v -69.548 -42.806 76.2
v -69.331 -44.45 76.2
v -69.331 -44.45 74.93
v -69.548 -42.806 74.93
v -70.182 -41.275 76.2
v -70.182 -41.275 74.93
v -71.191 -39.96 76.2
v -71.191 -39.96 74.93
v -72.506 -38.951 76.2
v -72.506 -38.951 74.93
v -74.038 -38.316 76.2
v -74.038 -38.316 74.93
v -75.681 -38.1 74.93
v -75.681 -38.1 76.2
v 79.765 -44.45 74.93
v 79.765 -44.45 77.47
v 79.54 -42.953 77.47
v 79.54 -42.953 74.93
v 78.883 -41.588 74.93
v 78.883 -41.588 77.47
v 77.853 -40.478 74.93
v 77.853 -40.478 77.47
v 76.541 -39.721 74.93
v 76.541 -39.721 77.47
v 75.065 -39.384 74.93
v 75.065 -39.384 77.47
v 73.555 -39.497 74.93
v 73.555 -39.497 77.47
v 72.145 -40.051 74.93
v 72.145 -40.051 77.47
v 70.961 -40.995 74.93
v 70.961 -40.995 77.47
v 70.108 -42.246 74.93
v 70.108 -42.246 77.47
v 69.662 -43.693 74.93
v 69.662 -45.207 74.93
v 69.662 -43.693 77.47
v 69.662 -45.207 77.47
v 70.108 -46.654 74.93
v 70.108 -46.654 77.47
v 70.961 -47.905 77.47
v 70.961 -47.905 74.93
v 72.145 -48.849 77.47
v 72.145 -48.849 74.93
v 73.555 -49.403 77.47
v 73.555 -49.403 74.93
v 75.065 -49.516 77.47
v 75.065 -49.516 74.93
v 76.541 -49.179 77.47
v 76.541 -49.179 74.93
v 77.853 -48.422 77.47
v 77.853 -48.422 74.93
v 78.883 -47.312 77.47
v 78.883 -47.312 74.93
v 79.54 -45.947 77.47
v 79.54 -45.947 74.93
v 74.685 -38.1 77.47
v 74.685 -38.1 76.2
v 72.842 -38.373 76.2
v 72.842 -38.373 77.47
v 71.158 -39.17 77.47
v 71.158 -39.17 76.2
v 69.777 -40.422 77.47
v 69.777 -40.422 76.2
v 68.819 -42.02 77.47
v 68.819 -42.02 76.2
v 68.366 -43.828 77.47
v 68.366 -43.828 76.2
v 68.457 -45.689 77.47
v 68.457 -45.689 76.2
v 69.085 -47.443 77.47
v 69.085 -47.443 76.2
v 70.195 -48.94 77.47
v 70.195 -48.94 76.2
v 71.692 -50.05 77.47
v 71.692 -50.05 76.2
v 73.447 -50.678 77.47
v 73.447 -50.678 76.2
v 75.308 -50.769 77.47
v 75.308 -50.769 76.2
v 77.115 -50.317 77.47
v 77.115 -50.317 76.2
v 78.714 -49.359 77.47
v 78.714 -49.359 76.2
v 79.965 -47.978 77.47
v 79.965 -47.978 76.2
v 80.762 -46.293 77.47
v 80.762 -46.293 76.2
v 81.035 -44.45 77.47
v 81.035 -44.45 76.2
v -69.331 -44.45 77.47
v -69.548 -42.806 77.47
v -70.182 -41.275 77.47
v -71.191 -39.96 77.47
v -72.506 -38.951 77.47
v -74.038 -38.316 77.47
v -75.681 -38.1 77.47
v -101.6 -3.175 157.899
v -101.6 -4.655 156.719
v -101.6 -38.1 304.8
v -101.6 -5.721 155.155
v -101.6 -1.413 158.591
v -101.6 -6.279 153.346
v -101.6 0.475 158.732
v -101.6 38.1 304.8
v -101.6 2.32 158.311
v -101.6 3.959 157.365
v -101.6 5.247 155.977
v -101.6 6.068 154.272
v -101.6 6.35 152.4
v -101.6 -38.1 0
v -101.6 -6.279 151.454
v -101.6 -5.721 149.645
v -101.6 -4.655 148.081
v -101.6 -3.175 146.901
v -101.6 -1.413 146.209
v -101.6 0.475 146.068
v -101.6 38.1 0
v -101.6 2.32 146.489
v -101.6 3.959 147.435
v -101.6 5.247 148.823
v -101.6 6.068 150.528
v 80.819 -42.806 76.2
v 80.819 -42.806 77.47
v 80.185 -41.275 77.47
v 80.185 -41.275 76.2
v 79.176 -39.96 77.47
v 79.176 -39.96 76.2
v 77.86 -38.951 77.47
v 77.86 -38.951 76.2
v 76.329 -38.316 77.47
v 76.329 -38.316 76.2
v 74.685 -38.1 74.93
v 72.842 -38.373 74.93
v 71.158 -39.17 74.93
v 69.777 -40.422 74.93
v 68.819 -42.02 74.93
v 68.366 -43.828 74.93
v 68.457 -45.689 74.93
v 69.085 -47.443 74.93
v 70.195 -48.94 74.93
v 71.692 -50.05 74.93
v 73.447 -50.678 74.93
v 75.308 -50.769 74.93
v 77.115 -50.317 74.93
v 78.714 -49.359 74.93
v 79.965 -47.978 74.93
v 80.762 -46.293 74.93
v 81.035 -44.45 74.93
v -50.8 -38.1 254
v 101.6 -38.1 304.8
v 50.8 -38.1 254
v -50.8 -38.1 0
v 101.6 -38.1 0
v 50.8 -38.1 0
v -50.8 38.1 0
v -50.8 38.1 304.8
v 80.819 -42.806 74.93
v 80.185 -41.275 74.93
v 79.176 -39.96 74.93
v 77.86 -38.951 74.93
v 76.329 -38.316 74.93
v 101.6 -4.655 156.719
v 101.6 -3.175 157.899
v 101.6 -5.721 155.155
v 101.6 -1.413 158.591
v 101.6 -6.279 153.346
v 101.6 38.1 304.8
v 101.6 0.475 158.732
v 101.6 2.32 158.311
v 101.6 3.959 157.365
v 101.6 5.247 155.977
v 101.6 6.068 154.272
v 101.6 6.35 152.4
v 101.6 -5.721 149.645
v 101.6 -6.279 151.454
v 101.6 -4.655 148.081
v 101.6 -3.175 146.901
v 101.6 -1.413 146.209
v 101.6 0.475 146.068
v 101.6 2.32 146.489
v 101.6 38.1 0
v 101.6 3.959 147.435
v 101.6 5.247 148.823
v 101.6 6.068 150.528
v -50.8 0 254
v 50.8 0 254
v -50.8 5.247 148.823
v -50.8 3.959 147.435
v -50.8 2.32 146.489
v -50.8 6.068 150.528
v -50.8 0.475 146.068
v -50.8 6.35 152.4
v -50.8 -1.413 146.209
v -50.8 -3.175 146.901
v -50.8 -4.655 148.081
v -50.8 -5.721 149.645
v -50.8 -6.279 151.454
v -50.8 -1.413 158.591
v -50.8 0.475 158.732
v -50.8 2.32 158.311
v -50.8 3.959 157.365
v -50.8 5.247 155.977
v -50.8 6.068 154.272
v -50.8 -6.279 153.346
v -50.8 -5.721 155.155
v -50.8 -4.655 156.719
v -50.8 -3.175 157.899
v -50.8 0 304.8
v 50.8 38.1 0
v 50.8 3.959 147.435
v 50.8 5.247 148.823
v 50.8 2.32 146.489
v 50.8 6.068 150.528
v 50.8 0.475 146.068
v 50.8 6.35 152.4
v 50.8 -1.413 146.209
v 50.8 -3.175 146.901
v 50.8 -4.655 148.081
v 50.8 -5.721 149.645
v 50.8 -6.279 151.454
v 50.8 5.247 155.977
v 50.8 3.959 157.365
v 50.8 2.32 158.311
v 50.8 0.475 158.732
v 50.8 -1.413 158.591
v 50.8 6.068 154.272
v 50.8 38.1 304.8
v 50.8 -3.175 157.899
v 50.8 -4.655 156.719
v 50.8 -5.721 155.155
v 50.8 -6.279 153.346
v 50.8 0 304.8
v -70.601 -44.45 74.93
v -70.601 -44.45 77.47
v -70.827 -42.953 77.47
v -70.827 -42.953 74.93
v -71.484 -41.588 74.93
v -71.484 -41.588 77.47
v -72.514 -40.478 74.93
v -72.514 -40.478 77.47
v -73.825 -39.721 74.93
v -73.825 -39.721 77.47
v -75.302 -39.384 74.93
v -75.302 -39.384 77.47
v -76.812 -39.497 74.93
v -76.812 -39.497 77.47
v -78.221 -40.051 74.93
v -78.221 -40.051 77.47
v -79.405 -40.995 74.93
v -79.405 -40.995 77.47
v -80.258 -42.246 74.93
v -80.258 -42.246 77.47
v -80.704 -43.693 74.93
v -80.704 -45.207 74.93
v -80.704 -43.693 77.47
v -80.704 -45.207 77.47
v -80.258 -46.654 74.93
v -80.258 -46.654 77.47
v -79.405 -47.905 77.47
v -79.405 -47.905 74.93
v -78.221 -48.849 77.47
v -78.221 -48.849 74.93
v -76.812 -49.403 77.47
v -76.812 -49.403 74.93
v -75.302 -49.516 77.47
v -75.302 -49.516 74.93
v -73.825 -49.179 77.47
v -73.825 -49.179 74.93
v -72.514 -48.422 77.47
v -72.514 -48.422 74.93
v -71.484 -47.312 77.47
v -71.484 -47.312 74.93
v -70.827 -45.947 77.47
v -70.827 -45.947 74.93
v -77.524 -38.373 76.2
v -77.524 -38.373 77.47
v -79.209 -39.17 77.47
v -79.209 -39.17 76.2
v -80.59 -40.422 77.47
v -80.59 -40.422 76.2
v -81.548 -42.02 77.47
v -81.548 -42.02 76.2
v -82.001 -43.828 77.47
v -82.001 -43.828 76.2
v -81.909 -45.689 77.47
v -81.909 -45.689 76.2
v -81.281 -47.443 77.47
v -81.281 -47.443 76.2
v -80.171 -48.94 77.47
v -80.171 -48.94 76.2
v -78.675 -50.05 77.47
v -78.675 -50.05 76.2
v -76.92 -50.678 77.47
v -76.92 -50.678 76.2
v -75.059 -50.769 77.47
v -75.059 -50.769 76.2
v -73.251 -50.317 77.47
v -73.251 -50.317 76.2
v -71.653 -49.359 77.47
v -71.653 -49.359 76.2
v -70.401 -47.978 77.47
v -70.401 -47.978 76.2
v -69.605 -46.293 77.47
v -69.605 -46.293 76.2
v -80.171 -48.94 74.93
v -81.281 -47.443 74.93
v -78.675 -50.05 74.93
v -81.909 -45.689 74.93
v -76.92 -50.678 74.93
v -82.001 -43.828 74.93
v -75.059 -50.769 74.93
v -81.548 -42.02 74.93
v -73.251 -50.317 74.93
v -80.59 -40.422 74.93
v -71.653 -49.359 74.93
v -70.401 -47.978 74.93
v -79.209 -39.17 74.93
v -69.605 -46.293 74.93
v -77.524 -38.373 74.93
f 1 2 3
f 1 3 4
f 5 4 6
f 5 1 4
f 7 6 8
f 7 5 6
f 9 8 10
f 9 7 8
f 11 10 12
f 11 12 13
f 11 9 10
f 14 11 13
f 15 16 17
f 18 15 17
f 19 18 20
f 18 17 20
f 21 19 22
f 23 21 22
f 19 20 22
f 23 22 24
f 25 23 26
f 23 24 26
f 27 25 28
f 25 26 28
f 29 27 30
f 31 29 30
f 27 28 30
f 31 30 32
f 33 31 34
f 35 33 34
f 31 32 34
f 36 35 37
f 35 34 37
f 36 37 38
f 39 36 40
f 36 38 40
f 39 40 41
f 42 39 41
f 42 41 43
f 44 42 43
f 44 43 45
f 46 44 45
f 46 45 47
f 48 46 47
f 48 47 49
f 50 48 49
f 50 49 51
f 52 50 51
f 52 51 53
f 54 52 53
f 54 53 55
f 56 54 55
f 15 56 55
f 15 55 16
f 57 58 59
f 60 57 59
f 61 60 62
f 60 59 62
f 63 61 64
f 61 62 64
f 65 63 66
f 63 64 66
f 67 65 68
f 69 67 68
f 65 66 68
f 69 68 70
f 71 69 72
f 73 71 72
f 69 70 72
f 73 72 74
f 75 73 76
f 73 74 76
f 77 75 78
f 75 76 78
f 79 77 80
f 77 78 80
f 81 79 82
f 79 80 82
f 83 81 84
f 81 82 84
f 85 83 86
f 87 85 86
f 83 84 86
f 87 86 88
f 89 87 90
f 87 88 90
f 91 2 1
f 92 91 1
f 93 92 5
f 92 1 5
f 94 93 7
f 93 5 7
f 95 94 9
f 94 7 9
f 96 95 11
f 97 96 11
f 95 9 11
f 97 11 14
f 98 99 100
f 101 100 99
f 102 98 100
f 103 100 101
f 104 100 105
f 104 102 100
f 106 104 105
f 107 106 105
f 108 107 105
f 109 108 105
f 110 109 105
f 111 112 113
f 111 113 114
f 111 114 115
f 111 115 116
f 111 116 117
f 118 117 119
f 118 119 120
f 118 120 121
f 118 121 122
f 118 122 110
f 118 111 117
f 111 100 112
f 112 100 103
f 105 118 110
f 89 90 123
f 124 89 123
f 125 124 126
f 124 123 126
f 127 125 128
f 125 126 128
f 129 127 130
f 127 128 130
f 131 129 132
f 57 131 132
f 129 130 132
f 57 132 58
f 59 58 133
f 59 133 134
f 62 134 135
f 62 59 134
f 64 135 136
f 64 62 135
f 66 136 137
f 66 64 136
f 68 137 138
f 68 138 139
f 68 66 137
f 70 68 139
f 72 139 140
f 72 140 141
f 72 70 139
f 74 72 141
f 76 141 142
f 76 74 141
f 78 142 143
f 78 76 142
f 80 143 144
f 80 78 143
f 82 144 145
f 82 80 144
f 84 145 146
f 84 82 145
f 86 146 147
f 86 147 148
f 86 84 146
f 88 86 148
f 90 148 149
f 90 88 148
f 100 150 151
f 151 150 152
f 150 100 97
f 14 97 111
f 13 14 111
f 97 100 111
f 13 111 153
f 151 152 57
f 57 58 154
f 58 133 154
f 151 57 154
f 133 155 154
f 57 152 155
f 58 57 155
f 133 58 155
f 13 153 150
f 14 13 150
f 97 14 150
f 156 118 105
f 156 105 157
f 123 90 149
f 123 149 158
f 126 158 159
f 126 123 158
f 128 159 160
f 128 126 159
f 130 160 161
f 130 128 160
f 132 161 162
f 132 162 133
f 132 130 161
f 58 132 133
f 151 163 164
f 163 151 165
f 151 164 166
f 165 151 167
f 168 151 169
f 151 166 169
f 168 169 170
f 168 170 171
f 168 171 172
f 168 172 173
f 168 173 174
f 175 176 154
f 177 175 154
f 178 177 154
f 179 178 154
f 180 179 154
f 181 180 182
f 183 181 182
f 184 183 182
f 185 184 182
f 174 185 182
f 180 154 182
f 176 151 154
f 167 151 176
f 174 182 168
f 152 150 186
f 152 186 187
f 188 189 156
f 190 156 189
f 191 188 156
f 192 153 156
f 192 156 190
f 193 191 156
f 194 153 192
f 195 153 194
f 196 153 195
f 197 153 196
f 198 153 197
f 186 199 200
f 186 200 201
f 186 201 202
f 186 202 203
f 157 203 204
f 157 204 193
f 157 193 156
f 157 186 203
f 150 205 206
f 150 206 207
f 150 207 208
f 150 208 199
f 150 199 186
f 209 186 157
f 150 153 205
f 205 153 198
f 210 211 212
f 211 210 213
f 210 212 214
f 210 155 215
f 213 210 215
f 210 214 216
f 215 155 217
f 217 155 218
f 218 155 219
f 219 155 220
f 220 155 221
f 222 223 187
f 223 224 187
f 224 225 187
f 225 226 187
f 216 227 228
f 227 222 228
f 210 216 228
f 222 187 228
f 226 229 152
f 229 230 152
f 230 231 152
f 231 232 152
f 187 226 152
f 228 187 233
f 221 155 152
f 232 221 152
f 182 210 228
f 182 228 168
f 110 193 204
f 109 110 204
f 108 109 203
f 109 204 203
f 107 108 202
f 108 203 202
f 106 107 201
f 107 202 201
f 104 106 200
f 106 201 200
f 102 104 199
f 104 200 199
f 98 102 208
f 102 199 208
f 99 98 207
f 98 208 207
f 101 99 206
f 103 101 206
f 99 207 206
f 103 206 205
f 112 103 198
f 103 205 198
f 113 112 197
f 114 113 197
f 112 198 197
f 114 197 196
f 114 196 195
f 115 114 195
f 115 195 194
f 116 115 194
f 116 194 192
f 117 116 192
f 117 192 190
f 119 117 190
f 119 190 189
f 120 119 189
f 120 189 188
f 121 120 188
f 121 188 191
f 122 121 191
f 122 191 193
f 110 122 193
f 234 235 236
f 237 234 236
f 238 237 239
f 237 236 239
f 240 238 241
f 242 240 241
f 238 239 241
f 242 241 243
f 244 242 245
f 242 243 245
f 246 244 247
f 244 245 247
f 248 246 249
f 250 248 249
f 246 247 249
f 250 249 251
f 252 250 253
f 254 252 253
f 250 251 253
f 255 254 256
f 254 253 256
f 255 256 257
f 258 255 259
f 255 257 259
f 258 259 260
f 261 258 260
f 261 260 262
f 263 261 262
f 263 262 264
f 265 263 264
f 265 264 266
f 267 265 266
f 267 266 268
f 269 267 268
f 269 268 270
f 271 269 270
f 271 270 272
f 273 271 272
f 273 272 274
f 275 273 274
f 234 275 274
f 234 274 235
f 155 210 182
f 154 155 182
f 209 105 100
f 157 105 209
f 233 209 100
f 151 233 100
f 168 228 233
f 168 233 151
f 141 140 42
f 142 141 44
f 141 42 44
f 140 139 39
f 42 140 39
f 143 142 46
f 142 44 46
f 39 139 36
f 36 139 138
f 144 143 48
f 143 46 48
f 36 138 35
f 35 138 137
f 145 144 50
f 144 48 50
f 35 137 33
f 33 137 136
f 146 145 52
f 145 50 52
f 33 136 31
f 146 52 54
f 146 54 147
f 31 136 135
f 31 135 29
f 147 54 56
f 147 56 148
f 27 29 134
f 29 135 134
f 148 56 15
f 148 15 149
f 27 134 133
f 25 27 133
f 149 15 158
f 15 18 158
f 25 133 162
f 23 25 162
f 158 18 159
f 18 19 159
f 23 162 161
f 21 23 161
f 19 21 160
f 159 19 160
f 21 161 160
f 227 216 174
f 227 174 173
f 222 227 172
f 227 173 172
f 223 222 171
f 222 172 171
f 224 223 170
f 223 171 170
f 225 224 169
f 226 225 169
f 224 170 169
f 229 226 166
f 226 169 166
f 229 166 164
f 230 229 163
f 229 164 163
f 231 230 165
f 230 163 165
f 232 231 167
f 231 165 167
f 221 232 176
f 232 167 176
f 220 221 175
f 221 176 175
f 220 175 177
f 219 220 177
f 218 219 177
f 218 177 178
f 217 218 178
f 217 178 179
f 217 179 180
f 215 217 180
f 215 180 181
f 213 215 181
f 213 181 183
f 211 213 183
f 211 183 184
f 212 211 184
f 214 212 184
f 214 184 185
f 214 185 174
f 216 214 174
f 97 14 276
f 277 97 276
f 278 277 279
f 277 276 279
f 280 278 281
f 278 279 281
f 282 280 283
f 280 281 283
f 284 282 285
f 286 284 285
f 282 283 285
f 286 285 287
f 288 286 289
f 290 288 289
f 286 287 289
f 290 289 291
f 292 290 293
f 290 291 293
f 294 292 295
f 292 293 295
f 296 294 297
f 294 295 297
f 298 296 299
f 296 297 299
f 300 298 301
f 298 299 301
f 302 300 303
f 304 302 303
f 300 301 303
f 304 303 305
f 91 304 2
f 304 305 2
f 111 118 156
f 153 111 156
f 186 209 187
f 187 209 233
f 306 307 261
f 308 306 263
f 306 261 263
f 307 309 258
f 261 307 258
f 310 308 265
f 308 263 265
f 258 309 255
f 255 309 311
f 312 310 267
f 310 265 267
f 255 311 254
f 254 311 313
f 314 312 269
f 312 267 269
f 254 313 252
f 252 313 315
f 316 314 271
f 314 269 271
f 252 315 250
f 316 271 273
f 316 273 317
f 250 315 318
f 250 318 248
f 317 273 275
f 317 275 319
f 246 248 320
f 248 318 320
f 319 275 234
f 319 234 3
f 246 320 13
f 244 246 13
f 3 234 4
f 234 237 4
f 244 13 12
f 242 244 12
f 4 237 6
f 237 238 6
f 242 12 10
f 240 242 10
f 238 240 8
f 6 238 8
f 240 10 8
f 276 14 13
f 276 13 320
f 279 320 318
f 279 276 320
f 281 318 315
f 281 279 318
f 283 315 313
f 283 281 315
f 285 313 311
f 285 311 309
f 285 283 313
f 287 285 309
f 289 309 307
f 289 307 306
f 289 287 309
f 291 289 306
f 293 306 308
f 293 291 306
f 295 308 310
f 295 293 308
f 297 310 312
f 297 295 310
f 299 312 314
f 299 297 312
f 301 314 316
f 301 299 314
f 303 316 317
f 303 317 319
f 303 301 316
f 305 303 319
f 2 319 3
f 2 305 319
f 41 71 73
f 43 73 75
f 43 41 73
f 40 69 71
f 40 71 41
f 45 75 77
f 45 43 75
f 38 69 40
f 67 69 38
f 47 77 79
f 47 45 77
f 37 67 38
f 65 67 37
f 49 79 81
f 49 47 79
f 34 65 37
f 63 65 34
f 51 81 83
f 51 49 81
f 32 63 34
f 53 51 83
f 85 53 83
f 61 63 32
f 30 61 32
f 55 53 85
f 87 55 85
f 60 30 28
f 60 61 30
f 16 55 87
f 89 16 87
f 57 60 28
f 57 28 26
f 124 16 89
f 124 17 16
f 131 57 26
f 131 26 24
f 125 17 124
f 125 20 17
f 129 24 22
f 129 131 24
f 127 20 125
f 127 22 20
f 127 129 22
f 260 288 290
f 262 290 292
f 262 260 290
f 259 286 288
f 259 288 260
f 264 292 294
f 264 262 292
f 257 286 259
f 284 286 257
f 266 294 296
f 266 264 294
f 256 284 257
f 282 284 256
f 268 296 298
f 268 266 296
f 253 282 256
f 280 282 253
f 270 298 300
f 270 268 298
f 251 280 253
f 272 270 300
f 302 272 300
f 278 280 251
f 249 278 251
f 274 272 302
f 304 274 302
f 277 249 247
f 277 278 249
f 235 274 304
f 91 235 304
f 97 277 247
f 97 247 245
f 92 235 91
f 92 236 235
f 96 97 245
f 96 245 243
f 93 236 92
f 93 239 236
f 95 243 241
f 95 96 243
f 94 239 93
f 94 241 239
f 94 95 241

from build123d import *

# Parameters (mm, degrees)
F0_W          = 203.2
F0_H          = 76.2
F1_DEPTH      = 304.8
F2_W          = 101.6
F2_H          = 254
F3_DEPTH      = 76.201
F4_R          = 6.35
F5_DEPTH      = 203.201
F7_R          = 6.35
F8_DEPTH      = 1.27
F8_DEPTH_BACK = 1.27
F9_R          = 5.08
F10_DEPTH     = 77.471
F11_W         = 101.6
F11_H         = 38.1
F12_DEPTH     = 304.801


with BuildPart() as f1:
    # F0 (on Top) → F1 (new body)
    with BuildSketch(Plane.XY):
        Rectangle(F0_W, F0_H)
    extrude(amount=F1_DEPTH)

    # F2 (on face) → F3 (cut, through all)
    with BuildSketch(Plane.XZ.offset(38.1)):
        with Locations((0, 127)):
            Rectangle(F2_W, F2_H)
    extrude(amount=-F3_DEPTH, mode=Mode.SUBTRACT)

    # F4 (on face) → F5 (cut, through all)
    with BuildSketch(Plane.YZ.offset(101.6)):
        with Locations((0, 152.4)):
            Circle(F4_R)
    extrude(amount=-F5_DEPTH, mode=Mode.SUBTRACT)

    # F7 (on offset) → F8 (join, two sides)
    with BuildSketch(Plane.XY.offset(76.2)) as f8_sk:
        with Locations((74.685387, -44.45)):
            Circle(F7_R)
        with Locations((-75.681136, -44.45)):
            Circle(F7_R)
    extrude(amount=F8_DEPTH)
    extrude(f8_sk.sketch, amount=-F8_DEPTH_BACK)

    # F9 (on face) → F10 (cut, through all)
    with BuildSketch(Plane.XY.offset(77.47)):
        with Locations((74.685387, -44.45)):
            Circle(F9_R)
        with Locations((-75.681136, -44.45)):
            Circle(F9_R)
    extrude(amount=-F10_DEPTH, mode=Mode.SUBTRACT)

    # F11 (on face) → F12 (cut, through all)
    with BuildSketch(Plane.XY.offset(304.8)):
        with Locations((0, 19.05)):
            Rectangle(F11_W, F11_H)
    extrude(amount=-F12_DEPTH, mode=Mode.SUBTRACT)


solid = f1.part
